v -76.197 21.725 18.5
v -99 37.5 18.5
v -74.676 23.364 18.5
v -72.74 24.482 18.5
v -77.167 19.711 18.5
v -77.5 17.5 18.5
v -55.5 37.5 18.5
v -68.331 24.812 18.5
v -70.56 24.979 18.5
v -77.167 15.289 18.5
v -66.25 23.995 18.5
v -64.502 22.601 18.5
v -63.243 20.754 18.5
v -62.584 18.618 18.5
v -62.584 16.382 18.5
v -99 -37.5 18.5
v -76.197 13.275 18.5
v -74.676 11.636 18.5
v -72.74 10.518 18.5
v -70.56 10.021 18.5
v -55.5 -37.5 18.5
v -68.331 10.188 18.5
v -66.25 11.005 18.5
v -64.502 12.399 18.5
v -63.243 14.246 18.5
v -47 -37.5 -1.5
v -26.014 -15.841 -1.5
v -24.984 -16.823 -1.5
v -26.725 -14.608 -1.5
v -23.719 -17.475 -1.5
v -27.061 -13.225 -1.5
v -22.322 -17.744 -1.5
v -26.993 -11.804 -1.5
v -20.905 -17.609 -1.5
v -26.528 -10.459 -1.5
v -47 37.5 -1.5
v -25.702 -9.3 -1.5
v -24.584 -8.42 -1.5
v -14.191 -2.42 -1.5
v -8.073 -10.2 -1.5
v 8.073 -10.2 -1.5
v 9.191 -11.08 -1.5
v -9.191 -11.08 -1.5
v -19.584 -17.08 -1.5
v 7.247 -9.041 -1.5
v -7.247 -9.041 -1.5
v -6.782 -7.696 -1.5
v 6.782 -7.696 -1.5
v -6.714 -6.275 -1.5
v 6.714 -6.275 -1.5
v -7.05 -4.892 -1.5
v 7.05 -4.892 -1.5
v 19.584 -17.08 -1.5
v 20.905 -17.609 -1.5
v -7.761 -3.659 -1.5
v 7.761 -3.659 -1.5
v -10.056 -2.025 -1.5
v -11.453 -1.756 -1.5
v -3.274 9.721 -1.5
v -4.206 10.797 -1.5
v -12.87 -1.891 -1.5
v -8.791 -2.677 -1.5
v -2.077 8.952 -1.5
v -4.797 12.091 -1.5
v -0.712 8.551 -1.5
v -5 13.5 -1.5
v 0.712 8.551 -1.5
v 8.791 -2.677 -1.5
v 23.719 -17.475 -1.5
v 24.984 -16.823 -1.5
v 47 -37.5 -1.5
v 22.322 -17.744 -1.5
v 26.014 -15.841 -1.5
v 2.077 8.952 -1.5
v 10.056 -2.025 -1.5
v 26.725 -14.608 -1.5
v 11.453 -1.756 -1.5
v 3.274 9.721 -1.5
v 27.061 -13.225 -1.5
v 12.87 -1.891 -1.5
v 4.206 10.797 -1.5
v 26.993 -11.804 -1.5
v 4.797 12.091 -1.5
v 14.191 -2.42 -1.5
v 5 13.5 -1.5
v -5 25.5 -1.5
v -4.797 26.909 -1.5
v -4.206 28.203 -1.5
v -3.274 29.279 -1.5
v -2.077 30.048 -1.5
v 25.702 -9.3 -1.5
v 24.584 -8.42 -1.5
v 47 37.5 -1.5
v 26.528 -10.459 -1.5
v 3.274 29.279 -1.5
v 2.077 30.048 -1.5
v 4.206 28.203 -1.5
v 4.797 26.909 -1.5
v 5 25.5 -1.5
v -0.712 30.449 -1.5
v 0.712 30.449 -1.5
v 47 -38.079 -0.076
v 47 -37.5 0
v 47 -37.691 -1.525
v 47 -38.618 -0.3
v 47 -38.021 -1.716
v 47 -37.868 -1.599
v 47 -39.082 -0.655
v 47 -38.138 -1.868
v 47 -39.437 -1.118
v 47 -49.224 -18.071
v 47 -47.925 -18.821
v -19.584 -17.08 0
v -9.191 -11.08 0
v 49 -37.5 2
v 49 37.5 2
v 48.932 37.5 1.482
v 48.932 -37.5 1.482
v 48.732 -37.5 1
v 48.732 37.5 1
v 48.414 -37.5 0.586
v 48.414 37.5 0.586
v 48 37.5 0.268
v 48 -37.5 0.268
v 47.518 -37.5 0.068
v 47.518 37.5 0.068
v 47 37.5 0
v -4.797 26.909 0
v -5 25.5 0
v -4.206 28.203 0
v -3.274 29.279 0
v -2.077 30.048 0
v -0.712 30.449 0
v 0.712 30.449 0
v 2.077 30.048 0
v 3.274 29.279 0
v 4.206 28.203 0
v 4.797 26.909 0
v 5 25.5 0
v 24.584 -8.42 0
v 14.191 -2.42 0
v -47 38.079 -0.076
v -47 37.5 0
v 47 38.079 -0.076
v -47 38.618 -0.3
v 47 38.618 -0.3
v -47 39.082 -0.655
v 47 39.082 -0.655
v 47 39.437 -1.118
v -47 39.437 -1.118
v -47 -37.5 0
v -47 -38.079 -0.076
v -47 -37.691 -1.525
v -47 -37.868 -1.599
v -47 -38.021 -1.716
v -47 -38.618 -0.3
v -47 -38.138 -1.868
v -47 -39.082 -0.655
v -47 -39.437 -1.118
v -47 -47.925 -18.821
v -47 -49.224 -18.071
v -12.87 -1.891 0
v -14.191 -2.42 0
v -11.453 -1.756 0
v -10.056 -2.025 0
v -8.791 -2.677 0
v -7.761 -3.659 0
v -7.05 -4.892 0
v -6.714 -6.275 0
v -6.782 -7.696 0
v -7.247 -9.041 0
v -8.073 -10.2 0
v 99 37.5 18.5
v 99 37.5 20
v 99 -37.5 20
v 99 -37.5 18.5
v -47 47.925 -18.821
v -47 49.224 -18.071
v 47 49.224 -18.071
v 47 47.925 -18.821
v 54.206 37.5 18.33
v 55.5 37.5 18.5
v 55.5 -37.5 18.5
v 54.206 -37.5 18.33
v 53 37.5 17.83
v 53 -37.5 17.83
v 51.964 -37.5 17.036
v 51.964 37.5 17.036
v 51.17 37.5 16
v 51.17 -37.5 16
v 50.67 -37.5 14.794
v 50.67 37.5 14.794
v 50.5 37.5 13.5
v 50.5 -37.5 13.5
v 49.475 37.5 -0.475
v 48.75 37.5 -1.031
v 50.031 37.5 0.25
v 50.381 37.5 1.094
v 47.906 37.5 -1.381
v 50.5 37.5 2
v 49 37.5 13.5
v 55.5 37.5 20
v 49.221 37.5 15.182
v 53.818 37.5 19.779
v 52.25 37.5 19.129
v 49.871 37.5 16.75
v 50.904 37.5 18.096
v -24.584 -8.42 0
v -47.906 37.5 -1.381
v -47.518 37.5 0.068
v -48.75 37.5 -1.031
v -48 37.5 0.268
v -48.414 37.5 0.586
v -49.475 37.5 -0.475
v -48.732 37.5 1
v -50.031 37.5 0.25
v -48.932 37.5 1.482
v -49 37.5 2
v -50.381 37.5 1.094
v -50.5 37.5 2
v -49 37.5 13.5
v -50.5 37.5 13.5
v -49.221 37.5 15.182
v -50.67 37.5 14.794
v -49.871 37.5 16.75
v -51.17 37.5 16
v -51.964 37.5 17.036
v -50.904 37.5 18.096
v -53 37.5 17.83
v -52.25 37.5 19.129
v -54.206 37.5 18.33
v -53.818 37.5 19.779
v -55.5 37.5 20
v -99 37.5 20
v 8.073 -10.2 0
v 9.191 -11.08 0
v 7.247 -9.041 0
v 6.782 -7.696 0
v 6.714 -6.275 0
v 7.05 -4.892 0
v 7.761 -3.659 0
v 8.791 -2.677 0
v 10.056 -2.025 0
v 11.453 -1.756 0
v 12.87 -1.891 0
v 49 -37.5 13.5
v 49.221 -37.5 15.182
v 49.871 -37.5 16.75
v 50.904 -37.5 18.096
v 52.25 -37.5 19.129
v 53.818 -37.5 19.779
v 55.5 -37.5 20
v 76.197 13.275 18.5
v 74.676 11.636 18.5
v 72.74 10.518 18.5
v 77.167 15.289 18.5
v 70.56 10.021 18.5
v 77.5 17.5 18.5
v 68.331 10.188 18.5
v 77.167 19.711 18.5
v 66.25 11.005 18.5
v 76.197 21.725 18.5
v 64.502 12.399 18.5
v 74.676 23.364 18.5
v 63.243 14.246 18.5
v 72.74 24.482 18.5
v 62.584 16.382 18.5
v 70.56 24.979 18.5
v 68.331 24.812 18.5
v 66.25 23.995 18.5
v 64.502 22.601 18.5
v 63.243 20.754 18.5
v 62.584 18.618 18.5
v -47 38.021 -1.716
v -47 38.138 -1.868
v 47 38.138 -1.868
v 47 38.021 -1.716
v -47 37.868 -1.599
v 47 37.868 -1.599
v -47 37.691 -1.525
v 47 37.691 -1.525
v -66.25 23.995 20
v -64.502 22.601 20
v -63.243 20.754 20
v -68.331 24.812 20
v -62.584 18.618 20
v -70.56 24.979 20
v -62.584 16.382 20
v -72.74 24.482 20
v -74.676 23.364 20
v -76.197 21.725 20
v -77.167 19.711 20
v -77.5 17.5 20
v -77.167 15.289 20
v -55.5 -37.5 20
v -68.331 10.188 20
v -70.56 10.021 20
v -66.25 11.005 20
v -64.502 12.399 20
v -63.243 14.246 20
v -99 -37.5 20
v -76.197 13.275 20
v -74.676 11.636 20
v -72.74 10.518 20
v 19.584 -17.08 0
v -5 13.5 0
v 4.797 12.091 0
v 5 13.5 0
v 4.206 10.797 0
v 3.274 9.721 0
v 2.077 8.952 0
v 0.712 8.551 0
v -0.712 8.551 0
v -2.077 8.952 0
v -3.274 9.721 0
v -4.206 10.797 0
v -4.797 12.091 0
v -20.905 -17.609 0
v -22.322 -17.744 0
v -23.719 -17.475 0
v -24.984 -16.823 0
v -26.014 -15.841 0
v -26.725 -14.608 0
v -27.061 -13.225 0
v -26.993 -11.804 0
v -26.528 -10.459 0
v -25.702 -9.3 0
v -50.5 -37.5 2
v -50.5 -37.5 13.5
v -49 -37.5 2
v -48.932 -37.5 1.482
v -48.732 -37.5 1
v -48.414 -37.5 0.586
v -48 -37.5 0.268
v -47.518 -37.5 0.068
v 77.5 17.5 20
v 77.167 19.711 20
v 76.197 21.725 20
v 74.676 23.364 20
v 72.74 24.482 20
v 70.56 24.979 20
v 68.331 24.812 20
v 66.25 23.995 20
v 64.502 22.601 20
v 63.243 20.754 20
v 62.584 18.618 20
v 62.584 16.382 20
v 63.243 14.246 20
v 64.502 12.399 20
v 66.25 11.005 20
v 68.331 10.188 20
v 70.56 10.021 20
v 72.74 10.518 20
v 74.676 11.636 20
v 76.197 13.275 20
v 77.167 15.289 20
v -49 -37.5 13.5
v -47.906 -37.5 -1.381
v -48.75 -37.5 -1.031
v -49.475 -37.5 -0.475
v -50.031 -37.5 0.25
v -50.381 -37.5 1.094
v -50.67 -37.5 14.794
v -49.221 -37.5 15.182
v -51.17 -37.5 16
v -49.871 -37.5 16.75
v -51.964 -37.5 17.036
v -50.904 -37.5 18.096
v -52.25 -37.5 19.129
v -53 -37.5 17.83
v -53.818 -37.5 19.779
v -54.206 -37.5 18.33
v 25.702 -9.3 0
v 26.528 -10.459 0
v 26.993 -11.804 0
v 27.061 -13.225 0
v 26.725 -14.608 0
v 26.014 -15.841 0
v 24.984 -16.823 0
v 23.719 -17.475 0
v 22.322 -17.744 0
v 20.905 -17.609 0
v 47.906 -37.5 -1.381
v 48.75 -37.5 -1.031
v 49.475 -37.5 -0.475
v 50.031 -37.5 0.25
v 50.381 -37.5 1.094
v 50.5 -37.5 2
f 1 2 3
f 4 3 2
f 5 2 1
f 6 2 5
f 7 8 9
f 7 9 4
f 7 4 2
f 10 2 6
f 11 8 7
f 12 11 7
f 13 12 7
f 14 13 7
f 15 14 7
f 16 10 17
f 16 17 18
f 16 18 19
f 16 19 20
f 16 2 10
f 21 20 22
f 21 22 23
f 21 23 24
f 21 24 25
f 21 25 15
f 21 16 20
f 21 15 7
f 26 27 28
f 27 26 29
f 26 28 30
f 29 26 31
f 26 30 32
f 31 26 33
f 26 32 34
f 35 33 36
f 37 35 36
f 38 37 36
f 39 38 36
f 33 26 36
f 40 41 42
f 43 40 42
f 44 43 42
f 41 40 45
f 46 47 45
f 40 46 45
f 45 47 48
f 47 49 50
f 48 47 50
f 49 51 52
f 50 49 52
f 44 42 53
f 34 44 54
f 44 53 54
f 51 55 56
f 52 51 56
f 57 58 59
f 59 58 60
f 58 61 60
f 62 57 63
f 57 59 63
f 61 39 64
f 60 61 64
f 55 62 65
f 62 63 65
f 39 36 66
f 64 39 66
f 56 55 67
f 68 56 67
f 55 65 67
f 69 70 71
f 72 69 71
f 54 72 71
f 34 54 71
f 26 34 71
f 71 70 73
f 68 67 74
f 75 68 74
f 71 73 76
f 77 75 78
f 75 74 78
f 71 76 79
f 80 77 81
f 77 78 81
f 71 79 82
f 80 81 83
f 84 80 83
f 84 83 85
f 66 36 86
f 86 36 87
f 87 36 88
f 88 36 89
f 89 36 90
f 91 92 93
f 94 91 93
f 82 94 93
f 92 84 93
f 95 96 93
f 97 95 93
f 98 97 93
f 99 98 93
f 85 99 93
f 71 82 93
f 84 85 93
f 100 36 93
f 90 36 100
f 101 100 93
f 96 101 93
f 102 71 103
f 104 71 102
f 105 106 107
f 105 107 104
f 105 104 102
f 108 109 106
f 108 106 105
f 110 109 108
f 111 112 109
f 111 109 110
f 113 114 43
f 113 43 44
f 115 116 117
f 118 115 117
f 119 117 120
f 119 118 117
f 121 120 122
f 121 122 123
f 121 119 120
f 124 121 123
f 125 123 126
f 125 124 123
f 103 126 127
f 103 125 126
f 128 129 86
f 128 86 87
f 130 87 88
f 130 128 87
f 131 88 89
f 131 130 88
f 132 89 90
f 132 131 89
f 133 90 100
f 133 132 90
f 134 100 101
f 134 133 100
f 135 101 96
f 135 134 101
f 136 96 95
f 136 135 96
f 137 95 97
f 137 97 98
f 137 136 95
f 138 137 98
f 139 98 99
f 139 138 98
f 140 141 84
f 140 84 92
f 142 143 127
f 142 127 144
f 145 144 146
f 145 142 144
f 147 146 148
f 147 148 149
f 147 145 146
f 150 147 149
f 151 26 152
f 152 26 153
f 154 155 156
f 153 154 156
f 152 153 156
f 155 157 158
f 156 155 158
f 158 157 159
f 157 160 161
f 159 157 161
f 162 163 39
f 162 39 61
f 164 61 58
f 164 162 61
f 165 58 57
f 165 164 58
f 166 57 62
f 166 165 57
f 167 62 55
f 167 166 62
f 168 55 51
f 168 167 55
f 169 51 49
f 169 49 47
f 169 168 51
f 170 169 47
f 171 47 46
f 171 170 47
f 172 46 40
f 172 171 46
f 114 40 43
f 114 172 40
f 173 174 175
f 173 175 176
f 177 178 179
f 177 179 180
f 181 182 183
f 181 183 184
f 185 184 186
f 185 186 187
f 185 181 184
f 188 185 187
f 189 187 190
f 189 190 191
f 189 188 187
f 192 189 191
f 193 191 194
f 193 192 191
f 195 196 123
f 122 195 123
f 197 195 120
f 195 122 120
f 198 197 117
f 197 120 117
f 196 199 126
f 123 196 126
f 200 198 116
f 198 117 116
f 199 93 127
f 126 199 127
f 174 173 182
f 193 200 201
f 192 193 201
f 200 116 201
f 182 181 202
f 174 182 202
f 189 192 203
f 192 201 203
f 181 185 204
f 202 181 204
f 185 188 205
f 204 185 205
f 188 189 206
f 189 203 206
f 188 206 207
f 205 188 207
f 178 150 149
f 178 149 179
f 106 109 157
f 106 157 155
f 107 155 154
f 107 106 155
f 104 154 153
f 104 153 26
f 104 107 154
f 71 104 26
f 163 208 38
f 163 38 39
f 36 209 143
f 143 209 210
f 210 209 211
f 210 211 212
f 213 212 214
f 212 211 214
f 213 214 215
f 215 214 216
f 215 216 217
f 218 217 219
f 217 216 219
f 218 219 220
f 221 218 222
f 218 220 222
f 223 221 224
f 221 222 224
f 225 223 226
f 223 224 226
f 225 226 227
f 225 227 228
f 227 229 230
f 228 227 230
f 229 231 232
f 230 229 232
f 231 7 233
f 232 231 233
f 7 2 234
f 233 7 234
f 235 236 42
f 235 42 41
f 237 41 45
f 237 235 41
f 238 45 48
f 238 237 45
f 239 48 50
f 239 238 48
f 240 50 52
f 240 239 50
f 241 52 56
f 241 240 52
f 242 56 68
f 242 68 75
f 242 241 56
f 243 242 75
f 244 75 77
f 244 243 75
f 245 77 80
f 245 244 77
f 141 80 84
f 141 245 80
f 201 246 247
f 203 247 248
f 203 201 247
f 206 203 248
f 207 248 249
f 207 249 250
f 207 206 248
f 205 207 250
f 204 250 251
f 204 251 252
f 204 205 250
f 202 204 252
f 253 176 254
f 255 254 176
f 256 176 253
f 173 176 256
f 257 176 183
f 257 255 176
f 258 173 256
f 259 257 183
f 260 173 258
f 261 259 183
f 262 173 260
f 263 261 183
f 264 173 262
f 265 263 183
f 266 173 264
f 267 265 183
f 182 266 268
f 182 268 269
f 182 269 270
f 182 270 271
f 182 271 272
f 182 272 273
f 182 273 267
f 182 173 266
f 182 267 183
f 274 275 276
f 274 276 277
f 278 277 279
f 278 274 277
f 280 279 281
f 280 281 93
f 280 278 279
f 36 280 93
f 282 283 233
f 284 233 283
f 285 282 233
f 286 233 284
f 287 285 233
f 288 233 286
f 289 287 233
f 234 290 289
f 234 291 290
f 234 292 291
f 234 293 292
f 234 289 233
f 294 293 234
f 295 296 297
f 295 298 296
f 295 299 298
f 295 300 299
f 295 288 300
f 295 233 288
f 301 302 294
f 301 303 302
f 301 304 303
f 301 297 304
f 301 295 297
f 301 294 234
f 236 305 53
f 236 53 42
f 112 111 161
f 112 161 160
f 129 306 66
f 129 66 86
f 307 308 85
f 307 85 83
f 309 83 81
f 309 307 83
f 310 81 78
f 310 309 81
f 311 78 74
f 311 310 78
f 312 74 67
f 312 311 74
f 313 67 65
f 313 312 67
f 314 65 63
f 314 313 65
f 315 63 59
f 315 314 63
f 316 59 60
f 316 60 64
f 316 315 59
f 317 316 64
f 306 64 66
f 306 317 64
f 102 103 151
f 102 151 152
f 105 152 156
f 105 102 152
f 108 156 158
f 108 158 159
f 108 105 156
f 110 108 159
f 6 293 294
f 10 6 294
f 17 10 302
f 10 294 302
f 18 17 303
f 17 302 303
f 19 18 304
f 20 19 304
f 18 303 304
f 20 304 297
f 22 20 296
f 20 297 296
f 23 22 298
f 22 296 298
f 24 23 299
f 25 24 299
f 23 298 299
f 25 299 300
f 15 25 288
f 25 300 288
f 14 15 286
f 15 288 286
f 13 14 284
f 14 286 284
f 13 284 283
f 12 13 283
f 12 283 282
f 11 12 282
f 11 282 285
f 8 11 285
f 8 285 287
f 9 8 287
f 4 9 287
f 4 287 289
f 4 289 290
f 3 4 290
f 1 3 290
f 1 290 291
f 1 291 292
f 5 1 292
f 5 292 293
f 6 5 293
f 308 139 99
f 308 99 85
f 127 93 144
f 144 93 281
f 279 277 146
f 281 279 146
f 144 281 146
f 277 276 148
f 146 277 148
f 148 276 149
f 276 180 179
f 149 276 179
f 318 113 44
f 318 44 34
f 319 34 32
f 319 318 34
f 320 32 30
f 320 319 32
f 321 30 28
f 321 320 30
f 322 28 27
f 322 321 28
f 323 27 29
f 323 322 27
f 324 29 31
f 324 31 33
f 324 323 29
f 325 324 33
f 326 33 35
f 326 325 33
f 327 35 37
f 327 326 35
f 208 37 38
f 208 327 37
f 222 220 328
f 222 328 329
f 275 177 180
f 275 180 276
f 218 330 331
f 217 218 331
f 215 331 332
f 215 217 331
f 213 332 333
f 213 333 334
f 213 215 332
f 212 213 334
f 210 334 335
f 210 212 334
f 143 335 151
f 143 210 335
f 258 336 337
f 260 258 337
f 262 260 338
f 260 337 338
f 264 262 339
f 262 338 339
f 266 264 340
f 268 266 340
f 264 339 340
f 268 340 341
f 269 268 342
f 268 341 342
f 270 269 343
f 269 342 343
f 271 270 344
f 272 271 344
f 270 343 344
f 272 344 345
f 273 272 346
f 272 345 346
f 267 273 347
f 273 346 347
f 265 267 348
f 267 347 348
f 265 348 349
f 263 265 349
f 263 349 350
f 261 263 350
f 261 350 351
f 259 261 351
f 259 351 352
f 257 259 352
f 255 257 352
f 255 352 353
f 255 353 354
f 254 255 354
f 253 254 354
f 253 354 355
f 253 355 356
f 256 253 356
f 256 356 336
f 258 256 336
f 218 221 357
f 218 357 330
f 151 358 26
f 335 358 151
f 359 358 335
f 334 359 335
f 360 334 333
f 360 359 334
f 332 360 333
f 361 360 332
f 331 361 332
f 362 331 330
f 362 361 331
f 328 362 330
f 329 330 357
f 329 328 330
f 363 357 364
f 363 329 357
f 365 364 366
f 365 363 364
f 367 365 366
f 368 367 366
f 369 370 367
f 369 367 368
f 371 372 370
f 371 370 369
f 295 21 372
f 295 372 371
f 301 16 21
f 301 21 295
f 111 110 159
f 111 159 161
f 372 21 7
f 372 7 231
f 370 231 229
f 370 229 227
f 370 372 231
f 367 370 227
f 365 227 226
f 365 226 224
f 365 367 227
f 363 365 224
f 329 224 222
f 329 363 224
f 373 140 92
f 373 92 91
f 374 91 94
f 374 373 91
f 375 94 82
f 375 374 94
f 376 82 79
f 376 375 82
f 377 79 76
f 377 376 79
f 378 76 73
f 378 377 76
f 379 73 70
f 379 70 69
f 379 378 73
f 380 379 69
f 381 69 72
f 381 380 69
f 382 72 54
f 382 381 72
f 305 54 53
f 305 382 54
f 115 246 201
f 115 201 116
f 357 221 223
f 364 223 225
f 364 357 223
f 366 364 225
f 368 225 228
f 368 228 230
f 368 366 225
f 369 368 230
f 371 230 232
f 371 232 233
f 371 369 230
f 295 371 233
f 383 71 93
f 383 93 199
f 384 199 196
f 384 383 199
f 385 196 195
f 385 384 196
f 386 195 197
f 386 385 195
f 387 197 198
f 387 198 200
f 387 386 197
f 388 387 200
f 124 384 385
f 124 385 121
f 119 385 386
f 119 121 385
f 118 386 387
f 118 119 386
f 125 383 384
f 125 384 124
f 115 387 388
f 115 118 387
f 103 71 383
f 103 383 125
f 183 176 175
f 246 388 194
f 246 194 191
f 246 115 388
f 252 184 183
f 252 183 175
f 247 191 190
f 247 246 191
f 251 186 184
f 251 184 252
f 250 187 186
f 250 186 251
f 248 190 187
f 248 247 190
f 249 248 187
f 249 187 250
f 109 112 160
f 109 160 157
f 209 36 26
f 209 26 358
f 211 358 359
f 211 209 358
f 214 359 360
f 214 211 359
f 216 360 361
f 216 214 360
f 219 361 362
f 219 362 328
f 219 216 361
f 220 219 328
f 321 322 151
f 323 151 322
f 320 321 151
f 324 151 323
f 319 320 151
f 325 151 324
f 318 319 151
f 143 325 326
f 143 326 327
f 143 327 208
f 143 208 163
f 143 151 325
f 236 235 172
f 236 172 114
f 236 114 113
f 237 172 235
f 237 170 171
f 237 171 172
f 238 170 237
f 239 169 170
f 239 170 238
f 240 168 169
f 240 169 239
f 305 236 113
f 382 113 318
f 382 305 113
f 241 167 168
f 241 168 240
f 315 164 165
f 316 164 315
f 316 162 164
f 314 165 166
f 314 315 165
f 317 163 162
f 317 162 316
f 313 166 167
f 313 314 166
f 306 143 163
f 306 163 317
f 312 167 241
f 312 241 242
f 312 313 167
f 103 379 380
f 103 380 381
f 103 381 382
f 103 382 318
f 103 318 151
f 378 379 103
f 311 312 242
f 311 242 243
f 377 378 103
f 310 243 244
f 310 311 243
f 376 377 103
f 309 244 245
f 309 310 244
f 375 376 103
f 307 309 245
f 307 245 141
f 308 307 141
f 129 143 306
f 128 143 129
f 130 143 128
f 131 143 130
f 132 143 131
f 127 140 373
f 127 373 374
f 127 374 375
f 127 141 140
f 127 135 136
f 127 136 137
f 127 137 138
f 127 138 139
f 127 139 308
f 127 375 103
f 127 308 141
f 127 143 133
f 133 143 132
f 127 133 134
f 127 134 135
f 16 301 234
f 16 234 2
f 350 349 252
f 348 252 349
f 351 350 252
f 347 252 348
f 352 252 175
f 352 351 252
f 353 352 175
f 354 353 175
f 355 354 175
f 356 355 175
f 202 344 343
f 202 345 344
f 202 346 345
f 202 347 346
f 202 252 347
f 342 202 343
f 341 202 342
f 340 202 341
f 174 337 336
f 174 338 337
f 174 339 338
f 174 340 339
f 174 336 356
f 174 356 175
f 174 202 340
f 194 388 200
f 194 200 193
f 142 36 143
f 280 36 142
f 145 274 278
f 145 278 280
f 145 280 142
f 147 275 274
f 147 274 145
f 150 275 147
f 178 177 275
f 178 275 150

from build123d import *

# Parameters (mm, degrees)
SKETCH1_W                    = 94
SKETCH1_H                    = 75
BASE_FLANGE1_DEPTH           = 1.5
EDGE_FLANGE1_DEPTH           = 75
EDGE_FLANGE2_STRIP_W         = 16
EDGE_FLANGE2_STRIP_H         = 1.5
EDGE_FLANGE2_STRIP_CUT_DEPTH = 75
EDGE_FLANGE2_DEPTH           = 75
EDGE_FLANGE3_DEPTH           = 75
EDGE_FLANGE4_STRIP_W         = 16
EDGE_FLANGE4_STRIP_H         = 1.5
EDGE_FLANGE4_STRIP_CUT_DEPTH = 75
EDGE_FLANGE4_DEPTH           = 75
SKETCH18_R                   = 7.5
CUT_EXTRUDE1_DEPTH           = 10
EDGE_FLANGE5_DEPTH           = 94
EDGE_FLANGE6_DEPTH           = 94


# Sheet-metal steps are written as plain solids
with BuildPart() as part:
    # Sketch1 → Base-Flange1 (new body)
    with BuildSketch(Plane.XY):
        Rectangle(SKETCH1_W, SKETCH1_H)
        with BuildLine():
            Line((5, 25.5), (5, 13.5))
            ThreePointArc((5, 13.5), (0, 8.5), (-5, 13.5))
            Line((-5, 13.5), (-5, 25.5))
            ThreePointArc((-5, 25.5), (0, 30.5), (5, 25.5))
        make_face(mode=Mode.SUBTRACT)
        with BuildLine():
            Line((19.583647797, -17.080127019), (9.191342951, -11.080127019))
            ThreePointArc((9.191342951, -11.080127019), (7.361215932, -4.25), (14.191342951, -2.419872981))
            Line((14.191342951, -2.419872981), (24.583647797, -8.419872981))
            ThreePointArc((24.583647797, -8.419872981), (26.413774815, -15.25), (19.583647797, -17.080127019))
        make_face(mode=Mode.SUBTRACT)
        with BuildLine():
            Line((-24.583647797, -8.419872981), (-14.191342951, -2.419872981))
            ThreePointArc((-14.191342951, -2.419872981), (-7.361215932, -4.25), (-9.191342951, -11.080127019))
            Line((-9.191342951, -11.080127019), (-19.583647797, -17.080127019))
            ThreePointArc((-19.583647797, -17.080127019), (-26.413774815, -15.25), (-24.583647797, -8.419872981))
        make_face(mode=Mode.SUBTRACT)
    extrude(amount=-BASE_FLANGE1_DEPTH)

    # Edge-Flange1 section (across the edge) → Edge-Flange1 (add)
    with BuildSketch(Plane(origin=(49, -37.5, 0), x_dir=(-1, 0, 0), z_dir=(0, 1, 0))):
        with BuildLine():
            Line((-1.5, 2), (-1.5, 18.5))
            Line((-1.5, 18.5), (0, 18.5))
            Line((0, 18.5), (0, 2))
            ThreePointArc((0, 2), (0.585786438, 0.585786438), (2, 0))
            Line((2, 0), (2, -1.5))
            ThreePointArc((2, -1.5), (-0.474873734, -0.474873734), (-1.5, 2))
        make_face()
    extrude(amount=EDGE_FLANGE1_DEPTH)

    # Edge-Flange2 strip (across the edge) → Edge-Flange2 strip cut (cut)
    with BuildSketch(Plane(origin=(50.5, 37.5, 18.5), x_dir=(0, 0, -1), z_dir=(0, -1, 0))):
        with Locations((-3, -0.75)):
            Rectangle(EDGE_FLANGE2_STRIP_W, EDGE_FLANGE2_STRIP_H)
    extrude(amount=EDGE_FLANGE2_STRIP_CUT_DEPTH, mode=Mode.SUBTRACT)

    # Edge-Flange2 section (across the edge) → Edge-Flange2 (add)
    with BuildSketch(Plane(origin=(50.5, 37.5, 18.5), x_dir=(0, 0, -1), z_dir=(0, -1, 0))):
        with BuildLine():
            Line((-1.5, 5), (-1.5, 48.5))
            Line((-1.5, 48.5), (0, 48.5))
            Line((0, 48.5), (0, 5))
            ThreePointArc((0, 5), (1.464466094, 1.464466094), (5, 0))
            Line((5, 0), (5, -1.5))
            ThreePointArc((5, -1.5), (0.403805922, 0.403805922), (-1.5, 5))
        make_face()
    extrude(amount=EDGE_FLANGE2_DEPTH)

    # Edge-Flange3 section (across the edge) → Edge-Flange3 (add)
    with BuildSketch(Plane(origin=(-49, 37.5, 0), x_dir=(1, 0, 0), z_dir=(0, -1, 0))):
        with BuildLine():
            Line((-1.5, 2), (-1.5, 18.5))
            Line((-1.5, 18.5), (0, 18.5))
            Line((0, 18.5), (0, 2))
            ThreePointArc((0, 2), (0.585786438, 0.585786438), (2, 0))
            Line((2, 0), (2, -1.5))
            ThreePointArc((2, -1.5), (-0.474873734, -0.474873734), (-1.5, 2))
        make_face()
    extrude(amount=EDGE_FLANGE3_DEPTH)

    # Edge-Flange4 strip (across the edge) → Edge-Flange4 strip cut (cut)
    with BuildSketch(Plane(origin=(-50.5, -37.5, 18.5), x_dir=(0, 0, -1), z_dir=(0, 1, 0))):
        with Locations((-3, -0.75)):
            Rectangle(EDGE_FLANGE4_STRIP_W, EDGE_FLANGE4_STRIP_H)
    extrude(amount=EDGE_FLANGE4_STRIP_CUT_DEPTH, mode=Mode.SUBTRACT)

    # Edge-Flange4 section (across the edge) → Edge-Flange4 (add)
    with BuildSketch(Plane(origin=(-50.5, -37.5, 18.5), x_dir=(0, 0, -1), z_dir=(0, 1, 0))):
        with BuildLine():
            Line((-1.5, 5), (-1.5, 48.5))
            Line((-1.5, 48.5), (0, 48.5))
            Line((0, 48.5), (0, 5))
            ThreePointArc((0, 5), (1.464466094, 1.464466094), (5, 0))
            Line((5, 0), (5, -1.5))
            ThreePointArc((5, -1.5), (0.403805922, 0.403805922), (-1.5, 5))
        make_face()
    extrude(amount=EDGE_FLANGE4_DEPTH)

    # Sketch18 → Cut-Extrude1 (cut)
    with BuildSketch(Plane.XY.offset(20)):
        with Locations((70, 17.5)):
            Circle(SKETCH18_R)
        with Locations(Location((-70, 17.5, 0), (0, 0, 180))):
            Circle(SKETCH18_R)
    extrude(amount=-CUT_EXTRUDE1_DEPTH, mode=Mode.SUBTRACT)

    # Edge-Flange5 section (across the edge) → Edge-Flange5 (add)
    with BuildSketch(Plane(origin=(-47, 37.925276208, -1.5), x_dir=(0, -0.8660254037844364, -0.5000000000000041), z_dir=(1, 0, 0))):
        with BuildLine():
            Line((-1.5, 0.425276208), (-1.5, 20))
            Line((-1.5, 20), (0, 20))
            Line((0, 20), (0, 0.425276208))
            ThreePointArc((0, 0.425276208), (0.098685688, 0.056976208), (0.3683, -0.212638104))
            Line((0.3683, -0.212638104), (-0.3817, -1.51167621))
            ThreePointArc((-0.3817, -1.51167621), (-1.200352418, -0.693023792), (-1.5, 0.425276208))
        make_face()
    extrude(amount=EDGE_FLANGE5_DEPTH)

    # Edge-Flange6 section (across the edge) → Edge-Flange6 (add)
    with BuildSketch(Plane(origin=(47, -37.925276208, -1.5), x_dir=(0, 0.8660254037844364, -0.5000000000000041), z_dir=(-1, 0, 0))):
        with BuildLine():
            Line((-1.5, 0.425276208), (-1.5, 20))
            Line((-1.5, 20), (0, 20))
            Line((0, 20), (0, 0.425276208))
            ThreePointArc((0, 0.425276208), (0.098685688, 0.056976208), (0.3683, -0.212638104))
            Line((0.3683, -0.212638104), (-0.3817, -1.51167621))
            ThreePointArc((-0.3817, -1.51167621), (-1.200352418, -0.693023792), (-1.5, 0.425276208))
        make_face()
    extrude(amount=EDGE_FLANGE6_DEPTH)


solid = part.part
